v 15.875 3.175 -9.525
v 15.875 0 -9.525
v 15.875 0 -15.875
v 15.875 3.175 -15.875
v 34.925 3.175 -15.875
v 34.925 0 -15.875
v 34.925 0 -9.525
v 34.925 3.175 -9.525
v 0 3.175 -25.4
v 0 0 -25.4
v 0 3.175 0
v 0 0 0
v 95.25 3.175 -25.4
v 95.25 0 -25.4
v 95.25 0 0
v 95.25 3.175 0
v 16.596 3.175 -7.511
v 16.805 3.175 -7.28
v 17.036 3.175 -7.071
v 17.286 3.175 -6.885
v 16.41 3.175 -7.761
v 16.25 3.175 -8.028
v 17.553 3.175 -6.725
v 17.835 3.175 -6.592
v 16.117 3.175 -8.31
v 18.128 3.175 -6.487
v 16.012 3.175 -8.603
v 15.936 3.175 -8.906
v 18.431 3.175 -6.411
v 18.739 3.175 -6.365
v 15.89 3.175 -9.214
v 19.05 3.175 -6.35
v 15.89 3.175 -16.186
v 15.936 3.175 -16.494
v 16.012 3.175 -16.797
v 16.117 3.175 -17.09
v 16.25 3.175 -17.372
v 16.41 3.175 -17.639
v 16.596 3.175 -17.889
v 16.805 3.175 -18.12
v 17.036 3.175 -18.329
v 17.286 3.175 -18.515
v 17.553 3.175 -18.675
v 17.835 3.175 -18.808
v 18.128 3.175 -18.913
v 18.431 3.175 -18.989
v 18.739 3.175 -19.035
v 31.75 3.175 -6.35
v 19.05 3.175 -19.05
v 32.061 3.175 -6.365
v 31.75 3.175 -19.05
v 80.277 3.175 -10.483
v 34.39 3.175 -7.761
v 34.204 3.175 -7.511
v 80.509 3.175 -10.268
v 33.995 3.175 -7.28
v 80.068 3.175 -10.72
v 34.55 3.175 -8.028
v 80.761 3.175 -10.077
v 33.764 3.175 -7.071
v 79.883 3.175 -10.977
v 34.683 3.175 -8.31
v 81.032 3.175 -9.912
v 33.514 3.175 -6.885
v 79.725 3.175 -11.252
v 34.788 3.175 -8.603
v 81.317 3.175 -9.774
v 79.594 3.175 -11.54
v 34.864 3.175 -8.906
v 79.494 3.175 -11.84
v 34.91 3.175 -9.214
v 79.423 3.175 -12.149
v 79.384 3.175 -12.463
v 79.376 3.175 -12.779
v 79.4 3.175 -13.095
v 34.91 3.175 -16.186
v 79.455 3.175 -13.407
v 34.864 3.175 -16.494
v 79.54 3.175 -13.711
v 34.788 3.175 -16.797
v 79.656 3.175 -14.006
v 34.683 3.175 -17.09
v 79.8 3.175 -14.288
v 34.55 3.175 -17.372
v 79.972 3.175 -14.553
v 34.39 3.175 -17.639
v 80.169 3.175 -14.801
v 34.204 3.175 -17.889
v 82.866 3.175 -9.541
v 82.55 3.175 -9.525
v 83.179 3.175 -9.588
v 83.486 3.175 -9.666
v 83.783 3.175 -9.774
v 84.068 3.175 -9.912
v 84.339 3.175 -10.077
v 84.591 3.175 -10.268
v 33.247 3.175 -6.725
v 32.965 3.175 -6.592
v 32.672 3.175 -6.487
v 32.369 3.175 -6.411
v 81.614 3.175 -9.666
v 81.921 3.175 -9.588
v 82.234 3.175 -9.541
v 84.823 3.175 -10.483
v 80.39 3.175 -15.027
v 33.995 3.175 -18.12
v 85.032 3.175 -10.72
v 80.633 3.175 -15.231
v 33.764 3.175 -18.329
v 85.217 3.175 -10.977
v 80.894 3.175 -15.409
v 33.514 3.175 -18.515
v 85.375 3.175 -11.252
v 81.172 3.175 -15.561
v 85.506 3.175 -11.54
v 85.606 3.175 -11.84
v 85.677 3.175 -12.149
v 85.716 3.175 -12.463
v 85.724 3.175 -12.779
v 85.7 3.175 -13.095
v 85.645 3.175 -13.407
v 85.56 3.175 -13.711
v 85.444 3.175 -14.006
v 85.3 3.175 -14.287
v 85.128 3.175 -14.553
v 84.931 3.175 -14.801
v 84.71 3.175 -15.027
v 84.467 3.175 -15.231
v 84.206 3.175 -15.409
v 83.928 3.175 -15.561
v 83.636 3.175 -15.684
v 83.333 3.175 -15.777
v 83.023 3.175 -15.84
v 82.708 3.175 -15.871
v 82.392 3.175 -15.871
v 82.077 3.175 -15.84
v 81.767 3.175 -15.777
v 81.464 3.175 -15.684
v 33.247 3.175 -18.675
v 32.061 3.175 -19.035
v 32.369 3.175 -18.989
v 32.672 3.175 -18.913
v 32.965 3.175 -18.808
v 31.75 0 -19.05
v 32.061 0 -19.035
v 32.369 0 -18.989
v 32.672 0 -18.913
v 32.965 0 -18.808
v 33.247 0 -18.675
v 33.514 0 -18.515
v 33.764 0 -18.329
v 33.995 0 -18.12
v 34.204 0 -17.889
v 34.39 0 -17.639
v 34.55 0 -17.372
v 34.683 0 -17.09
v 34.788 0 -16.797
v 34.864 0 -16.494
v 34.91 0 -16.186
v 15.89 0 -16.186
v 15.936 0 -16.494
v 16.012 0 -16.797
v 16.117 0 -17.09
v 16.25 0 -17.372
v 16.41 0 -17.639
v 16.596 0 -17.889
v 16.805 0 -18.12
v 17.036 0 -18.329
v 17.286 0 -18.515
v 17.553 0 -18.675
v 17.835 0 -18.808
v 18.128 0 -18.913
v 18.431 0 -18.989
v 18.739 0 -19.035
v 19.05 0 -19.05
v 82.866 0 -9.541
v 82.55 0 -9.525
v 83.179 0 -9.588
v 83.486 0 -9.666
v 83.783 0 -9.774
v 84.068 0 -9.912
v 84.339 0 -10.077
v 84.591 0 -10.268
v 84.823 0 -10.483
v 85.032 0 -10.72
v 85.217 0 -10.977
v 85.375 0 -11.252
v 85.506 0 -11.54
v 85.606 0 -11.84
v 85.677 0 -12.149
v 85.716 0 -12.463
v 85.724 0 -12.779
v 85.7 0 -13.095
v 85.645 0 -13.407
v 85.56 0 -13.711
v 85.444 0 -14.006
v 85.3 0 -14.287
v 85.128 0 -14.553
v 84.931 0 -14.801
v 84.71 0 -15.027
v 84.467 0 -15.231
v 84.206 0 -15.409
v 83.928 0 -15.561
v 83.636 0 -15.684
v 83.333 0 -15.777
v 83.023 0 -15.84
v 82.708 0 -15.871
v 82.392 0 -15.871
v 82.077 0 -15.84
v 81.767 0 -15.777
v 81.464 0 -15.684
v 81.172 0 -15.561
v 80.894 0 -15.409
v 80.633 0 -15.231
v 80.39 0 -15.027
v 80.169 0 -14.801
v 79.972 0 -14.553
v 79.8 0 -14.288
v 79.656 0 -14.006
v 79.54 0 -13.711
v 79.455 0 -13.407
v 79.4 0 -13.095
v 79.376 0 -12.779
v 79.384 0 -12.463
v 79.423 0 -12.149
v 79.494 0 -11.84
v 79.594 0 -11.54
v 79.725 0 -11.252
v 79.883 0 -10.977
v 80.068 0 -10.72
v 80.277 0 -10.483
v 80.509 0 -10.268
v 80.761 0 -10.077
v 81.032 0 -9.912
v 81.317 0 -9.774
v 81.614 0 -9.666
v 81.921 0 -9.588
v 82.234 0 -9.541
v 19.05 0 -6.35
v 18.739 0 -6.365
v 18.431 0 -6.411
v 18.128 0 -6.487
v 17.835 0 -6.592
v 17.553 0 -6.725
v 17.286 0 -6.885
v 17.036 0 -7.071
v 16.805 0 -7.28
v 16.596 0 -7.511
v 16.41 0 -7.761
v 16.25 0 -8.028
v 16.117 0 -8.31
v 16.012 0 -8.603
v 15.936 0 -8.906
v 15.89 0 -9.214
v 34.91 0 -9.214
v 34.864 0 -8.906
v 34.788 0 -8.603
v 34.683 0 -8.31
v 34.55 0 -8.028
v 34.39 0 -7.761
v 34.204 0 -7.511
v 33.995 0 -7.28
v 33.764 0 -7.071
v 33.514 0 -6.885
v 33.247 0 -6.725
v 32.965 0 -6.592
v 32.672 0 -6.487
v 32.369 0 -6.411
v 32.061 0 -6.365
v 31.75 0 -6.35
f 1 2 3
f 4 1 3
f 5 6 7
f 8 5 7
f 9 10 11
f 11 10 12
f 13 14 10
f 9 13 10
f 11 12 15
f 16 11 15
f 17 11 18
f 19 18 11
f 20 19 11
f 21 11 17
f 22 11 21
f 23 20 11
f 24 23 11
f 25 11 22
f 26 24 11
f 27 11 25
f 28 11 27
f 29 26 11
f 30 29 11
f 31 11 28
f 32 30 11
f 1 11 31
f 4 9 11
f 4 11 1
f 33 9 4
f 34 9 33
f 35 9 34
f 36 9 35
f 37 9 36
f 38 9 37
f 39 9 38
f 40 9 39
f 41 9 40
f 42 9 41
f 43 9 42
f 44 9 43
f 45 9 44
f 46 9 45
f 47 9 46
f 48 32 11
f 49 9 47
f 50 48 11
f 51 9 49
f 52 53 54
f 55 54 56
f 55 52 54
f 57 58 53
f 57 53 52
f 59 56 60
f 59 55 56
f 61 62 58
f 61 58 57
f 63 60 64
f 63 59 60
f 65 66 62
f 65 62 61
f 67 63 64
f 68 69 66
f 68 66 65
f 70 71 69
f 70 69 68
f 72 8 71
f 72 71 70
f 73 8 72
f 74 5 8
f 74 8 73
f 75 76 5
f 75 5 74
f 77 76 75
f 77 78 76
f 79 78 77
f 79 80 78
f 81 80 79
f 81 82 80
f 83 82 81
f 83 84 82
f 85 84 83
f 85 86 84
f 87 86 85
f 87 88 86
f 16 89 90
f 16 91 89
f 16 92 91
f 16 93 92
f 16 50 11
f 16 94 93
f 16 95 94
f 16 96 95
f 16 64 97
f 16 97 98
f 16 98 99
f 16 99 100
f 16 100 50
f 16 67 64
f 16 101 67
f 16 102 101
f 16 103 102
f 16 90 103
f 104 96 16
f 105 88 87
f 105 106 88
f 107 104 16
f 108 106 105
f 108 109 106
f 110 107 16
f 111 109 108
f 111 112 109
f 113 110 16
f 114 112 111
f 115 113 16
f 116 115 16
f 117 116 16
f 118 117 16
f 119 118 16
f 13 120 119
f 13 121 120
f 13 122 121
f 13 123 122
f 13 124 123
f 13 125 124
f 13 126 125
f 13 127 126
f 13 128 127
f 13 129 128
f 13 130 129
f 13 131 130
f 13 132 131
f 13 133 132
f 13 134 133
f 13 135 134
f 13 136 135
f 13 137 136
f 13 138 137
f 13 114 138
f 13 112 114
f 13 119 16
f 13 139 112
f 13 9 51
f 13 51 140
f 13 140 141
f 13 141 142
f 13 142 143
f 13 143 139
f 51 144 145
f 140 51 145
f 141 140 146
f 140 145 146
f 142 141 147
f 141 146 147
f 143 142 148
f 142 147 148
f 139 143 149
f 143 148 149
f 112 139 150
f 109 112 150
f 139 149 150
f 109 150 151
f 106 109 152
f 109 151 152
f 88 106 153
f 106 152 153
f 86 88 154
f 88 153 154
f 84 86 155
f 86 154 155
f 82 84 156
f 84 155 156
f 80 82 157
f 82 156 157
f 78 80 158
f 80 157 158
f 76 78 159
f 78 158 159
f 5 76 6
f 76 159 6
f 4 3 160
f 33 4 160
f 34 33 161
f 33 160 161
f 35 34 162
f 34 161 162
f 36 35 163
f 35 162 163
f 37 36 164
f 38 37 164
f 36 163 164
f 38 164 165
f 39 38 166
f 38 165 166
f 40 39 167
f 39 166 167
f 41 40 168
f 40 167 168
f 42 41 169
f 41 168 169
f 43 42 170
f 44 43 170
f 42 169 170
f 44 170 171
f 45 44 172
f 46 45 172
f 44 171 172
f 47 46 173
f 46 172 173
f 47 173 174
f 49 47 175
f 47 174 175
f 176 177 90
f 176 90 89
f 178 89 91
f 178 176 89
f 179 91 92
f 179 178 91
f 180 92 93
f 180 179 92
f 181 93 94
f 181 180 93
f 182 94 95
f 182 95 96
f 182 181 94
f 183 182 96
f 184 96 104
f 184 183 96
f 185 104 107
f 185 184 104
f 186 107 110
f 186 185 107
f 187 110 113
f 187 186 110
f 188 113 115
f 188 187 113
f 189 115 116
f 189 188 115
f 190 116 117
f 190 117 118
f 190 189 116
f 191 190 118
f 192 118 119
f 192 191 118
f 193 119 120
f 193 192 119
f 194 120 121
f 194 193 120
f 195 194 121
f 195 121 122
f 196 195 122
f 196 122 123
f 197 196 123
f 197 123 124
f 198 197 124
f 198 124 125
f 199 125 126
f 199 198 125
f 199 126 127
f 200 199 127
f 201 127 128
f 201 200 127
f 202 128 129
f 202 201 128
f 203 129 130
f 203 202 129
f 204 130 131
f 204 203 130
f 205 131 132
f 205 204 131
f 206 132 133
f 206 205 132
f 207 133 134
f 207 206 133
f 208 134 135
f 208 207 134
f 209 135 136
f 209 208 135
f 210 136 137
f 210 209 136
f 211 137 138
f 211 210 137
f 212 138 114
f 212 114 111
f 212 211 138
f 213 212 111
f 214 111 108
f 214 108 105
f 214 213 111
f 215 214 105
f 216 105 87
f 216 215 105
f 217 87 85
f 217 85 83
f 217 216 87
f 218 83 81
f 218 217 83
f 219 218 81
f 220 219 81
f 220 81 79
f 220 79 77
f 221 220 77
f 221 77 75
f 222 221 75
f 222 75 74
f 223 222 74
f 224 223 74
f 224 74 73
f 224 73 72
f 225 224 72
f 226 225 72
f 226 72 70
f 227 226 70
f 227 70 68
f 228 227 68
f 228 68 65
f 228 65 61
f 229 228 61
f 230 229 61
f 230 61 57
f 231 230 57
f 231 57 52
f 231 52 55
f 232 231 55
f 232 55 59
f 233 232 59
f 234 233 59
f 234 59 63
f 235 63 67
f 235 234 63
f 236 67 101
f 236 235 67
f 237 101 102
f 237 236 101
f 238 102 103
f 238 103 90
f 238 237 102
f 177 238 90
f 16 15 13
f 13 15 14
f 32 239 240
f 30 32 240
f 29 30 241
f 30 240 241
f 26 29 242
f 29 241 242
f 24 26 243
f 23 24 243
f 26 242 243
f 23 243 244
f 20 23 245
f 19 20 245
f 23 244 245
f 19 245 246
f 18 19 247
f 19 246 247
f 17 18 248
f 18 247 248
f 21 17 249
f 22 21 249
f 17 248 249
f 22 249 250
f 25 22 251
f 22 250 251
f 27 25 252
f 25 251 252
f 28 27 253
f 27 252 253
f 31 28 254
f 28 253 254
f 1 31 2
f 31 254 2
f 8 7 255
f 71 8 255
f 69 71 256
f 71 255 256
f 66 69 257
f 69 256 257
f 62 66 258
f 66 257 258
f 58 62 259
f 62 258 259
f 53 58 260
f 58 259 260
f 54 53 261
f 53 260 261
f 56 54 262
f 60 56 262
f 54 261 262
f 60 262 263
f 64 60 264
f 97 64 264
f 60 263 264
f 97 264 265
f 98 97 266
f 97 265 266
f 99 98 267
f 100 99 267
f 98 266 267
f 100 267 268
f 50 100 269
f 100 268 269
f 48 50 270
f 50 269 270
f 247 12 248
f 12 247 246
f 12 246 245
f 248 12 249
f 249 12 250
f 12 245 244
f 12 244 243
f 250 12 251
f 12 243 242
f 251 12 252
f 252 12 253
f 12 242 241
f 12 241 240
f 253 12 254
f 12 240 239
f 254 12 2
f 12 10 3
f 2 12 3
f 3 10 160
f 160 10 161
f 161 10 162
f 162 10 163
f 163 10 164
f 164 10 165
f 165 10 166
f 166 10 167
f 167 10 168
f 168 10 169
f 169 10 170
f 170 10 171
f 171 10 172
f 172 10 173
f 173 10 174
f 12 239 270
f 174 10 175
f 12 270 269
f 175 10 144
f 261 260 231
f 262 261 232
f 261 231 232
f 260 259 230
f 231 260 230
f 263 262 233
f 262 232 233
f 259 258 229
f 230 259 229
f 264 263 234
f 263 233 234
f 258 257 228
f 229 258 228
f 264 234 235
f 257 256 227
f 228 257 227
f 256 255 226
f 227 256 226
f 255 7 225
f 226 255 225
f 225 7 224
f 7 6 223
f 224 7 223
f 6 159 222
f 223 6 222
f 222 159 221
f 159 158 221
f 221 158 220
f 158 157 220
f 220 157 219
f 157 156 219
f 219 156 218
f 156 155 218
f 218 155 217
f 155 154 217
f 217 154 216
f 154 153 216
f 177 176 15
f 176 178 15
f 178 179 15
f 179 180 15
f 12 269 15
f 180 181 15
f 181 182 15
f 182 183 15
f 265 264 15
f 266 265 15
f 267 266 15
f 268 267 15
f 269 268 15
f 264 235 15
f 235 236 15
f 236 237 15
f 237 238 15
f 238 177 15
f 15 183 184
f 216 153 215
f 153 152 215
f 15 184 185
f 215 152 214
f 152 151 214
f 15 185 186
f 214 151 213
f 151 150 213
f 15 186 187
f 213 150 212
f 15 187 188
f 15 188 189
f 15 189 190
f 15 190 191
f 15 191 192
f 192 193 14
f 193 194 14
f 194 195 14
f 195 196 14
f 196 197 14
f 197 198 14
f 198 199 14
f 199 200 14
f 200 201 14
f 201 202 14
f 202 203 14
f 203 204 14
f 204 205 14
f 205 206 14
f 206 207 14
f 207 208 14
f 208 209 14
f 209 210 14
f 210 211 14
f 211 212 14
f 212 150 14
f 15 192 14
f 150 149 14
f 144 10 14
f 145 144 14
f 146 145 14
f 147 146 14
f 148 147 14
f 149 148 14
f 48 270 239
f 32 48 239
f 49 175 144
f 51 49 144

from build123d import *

# Parameters (mm, degrees)
SKETCH1_R           = 3.175
BOSS_EXTRUDE1_DEPTH = 3.175


with BuildPart() as part:
    # Sketch1 → Boss-Extrude1 (new body)
    with BuildSketch(Plane(origin=(0, 0, 0), x_dir=(1, 0, 0), z_dir=(0, 1, 0))):
        Polygon((0, 4.7625), (0, 0), (6.35, 0), (44.45, 0), (57.15, 0), (95.25, 0), (95.25, 25.4), (57.15, 25.4), (44.45, 25.4), (6.35, 25.4), (0, 25.4), (0, 20.6375), align=None)
        with Locations(Location((82.55, 12.7, 0), (0, 0, 270))):
            Circle(SKETCH1_R, mode=Mode.SUBTRACT)
        with BuildLine():
            ThreePointArc((15.875, 15.875), (16.80493597, 18.12006403), (19.05, 19.05))
            Line((19.05, 19.05), (31.75, 19.05))
            ThreePointArc((31.75, 19.05), (33.99506403, 18.12006403), (34.925, 15.875))
            Line((34.925, 15.875), (34.925, 9.525))
            ThreePointArc((34.925, 9.525), (33.99506403, 7.27993597), (31.75, 6.35))
            Line((31.75, 6.35), (19.05, 6.35))
            ThreePointArc((19.05, 6.35), (16.80493597, 7.27993597), (15.875, 9.525))
            Line((15.875, 9.525), (15.875, 15.875))
        make_face(mode=Mode.SUBTRACT)
    extrude(amount=BOSS_EXTRUDE1_DEPTH)


solid = part.part
